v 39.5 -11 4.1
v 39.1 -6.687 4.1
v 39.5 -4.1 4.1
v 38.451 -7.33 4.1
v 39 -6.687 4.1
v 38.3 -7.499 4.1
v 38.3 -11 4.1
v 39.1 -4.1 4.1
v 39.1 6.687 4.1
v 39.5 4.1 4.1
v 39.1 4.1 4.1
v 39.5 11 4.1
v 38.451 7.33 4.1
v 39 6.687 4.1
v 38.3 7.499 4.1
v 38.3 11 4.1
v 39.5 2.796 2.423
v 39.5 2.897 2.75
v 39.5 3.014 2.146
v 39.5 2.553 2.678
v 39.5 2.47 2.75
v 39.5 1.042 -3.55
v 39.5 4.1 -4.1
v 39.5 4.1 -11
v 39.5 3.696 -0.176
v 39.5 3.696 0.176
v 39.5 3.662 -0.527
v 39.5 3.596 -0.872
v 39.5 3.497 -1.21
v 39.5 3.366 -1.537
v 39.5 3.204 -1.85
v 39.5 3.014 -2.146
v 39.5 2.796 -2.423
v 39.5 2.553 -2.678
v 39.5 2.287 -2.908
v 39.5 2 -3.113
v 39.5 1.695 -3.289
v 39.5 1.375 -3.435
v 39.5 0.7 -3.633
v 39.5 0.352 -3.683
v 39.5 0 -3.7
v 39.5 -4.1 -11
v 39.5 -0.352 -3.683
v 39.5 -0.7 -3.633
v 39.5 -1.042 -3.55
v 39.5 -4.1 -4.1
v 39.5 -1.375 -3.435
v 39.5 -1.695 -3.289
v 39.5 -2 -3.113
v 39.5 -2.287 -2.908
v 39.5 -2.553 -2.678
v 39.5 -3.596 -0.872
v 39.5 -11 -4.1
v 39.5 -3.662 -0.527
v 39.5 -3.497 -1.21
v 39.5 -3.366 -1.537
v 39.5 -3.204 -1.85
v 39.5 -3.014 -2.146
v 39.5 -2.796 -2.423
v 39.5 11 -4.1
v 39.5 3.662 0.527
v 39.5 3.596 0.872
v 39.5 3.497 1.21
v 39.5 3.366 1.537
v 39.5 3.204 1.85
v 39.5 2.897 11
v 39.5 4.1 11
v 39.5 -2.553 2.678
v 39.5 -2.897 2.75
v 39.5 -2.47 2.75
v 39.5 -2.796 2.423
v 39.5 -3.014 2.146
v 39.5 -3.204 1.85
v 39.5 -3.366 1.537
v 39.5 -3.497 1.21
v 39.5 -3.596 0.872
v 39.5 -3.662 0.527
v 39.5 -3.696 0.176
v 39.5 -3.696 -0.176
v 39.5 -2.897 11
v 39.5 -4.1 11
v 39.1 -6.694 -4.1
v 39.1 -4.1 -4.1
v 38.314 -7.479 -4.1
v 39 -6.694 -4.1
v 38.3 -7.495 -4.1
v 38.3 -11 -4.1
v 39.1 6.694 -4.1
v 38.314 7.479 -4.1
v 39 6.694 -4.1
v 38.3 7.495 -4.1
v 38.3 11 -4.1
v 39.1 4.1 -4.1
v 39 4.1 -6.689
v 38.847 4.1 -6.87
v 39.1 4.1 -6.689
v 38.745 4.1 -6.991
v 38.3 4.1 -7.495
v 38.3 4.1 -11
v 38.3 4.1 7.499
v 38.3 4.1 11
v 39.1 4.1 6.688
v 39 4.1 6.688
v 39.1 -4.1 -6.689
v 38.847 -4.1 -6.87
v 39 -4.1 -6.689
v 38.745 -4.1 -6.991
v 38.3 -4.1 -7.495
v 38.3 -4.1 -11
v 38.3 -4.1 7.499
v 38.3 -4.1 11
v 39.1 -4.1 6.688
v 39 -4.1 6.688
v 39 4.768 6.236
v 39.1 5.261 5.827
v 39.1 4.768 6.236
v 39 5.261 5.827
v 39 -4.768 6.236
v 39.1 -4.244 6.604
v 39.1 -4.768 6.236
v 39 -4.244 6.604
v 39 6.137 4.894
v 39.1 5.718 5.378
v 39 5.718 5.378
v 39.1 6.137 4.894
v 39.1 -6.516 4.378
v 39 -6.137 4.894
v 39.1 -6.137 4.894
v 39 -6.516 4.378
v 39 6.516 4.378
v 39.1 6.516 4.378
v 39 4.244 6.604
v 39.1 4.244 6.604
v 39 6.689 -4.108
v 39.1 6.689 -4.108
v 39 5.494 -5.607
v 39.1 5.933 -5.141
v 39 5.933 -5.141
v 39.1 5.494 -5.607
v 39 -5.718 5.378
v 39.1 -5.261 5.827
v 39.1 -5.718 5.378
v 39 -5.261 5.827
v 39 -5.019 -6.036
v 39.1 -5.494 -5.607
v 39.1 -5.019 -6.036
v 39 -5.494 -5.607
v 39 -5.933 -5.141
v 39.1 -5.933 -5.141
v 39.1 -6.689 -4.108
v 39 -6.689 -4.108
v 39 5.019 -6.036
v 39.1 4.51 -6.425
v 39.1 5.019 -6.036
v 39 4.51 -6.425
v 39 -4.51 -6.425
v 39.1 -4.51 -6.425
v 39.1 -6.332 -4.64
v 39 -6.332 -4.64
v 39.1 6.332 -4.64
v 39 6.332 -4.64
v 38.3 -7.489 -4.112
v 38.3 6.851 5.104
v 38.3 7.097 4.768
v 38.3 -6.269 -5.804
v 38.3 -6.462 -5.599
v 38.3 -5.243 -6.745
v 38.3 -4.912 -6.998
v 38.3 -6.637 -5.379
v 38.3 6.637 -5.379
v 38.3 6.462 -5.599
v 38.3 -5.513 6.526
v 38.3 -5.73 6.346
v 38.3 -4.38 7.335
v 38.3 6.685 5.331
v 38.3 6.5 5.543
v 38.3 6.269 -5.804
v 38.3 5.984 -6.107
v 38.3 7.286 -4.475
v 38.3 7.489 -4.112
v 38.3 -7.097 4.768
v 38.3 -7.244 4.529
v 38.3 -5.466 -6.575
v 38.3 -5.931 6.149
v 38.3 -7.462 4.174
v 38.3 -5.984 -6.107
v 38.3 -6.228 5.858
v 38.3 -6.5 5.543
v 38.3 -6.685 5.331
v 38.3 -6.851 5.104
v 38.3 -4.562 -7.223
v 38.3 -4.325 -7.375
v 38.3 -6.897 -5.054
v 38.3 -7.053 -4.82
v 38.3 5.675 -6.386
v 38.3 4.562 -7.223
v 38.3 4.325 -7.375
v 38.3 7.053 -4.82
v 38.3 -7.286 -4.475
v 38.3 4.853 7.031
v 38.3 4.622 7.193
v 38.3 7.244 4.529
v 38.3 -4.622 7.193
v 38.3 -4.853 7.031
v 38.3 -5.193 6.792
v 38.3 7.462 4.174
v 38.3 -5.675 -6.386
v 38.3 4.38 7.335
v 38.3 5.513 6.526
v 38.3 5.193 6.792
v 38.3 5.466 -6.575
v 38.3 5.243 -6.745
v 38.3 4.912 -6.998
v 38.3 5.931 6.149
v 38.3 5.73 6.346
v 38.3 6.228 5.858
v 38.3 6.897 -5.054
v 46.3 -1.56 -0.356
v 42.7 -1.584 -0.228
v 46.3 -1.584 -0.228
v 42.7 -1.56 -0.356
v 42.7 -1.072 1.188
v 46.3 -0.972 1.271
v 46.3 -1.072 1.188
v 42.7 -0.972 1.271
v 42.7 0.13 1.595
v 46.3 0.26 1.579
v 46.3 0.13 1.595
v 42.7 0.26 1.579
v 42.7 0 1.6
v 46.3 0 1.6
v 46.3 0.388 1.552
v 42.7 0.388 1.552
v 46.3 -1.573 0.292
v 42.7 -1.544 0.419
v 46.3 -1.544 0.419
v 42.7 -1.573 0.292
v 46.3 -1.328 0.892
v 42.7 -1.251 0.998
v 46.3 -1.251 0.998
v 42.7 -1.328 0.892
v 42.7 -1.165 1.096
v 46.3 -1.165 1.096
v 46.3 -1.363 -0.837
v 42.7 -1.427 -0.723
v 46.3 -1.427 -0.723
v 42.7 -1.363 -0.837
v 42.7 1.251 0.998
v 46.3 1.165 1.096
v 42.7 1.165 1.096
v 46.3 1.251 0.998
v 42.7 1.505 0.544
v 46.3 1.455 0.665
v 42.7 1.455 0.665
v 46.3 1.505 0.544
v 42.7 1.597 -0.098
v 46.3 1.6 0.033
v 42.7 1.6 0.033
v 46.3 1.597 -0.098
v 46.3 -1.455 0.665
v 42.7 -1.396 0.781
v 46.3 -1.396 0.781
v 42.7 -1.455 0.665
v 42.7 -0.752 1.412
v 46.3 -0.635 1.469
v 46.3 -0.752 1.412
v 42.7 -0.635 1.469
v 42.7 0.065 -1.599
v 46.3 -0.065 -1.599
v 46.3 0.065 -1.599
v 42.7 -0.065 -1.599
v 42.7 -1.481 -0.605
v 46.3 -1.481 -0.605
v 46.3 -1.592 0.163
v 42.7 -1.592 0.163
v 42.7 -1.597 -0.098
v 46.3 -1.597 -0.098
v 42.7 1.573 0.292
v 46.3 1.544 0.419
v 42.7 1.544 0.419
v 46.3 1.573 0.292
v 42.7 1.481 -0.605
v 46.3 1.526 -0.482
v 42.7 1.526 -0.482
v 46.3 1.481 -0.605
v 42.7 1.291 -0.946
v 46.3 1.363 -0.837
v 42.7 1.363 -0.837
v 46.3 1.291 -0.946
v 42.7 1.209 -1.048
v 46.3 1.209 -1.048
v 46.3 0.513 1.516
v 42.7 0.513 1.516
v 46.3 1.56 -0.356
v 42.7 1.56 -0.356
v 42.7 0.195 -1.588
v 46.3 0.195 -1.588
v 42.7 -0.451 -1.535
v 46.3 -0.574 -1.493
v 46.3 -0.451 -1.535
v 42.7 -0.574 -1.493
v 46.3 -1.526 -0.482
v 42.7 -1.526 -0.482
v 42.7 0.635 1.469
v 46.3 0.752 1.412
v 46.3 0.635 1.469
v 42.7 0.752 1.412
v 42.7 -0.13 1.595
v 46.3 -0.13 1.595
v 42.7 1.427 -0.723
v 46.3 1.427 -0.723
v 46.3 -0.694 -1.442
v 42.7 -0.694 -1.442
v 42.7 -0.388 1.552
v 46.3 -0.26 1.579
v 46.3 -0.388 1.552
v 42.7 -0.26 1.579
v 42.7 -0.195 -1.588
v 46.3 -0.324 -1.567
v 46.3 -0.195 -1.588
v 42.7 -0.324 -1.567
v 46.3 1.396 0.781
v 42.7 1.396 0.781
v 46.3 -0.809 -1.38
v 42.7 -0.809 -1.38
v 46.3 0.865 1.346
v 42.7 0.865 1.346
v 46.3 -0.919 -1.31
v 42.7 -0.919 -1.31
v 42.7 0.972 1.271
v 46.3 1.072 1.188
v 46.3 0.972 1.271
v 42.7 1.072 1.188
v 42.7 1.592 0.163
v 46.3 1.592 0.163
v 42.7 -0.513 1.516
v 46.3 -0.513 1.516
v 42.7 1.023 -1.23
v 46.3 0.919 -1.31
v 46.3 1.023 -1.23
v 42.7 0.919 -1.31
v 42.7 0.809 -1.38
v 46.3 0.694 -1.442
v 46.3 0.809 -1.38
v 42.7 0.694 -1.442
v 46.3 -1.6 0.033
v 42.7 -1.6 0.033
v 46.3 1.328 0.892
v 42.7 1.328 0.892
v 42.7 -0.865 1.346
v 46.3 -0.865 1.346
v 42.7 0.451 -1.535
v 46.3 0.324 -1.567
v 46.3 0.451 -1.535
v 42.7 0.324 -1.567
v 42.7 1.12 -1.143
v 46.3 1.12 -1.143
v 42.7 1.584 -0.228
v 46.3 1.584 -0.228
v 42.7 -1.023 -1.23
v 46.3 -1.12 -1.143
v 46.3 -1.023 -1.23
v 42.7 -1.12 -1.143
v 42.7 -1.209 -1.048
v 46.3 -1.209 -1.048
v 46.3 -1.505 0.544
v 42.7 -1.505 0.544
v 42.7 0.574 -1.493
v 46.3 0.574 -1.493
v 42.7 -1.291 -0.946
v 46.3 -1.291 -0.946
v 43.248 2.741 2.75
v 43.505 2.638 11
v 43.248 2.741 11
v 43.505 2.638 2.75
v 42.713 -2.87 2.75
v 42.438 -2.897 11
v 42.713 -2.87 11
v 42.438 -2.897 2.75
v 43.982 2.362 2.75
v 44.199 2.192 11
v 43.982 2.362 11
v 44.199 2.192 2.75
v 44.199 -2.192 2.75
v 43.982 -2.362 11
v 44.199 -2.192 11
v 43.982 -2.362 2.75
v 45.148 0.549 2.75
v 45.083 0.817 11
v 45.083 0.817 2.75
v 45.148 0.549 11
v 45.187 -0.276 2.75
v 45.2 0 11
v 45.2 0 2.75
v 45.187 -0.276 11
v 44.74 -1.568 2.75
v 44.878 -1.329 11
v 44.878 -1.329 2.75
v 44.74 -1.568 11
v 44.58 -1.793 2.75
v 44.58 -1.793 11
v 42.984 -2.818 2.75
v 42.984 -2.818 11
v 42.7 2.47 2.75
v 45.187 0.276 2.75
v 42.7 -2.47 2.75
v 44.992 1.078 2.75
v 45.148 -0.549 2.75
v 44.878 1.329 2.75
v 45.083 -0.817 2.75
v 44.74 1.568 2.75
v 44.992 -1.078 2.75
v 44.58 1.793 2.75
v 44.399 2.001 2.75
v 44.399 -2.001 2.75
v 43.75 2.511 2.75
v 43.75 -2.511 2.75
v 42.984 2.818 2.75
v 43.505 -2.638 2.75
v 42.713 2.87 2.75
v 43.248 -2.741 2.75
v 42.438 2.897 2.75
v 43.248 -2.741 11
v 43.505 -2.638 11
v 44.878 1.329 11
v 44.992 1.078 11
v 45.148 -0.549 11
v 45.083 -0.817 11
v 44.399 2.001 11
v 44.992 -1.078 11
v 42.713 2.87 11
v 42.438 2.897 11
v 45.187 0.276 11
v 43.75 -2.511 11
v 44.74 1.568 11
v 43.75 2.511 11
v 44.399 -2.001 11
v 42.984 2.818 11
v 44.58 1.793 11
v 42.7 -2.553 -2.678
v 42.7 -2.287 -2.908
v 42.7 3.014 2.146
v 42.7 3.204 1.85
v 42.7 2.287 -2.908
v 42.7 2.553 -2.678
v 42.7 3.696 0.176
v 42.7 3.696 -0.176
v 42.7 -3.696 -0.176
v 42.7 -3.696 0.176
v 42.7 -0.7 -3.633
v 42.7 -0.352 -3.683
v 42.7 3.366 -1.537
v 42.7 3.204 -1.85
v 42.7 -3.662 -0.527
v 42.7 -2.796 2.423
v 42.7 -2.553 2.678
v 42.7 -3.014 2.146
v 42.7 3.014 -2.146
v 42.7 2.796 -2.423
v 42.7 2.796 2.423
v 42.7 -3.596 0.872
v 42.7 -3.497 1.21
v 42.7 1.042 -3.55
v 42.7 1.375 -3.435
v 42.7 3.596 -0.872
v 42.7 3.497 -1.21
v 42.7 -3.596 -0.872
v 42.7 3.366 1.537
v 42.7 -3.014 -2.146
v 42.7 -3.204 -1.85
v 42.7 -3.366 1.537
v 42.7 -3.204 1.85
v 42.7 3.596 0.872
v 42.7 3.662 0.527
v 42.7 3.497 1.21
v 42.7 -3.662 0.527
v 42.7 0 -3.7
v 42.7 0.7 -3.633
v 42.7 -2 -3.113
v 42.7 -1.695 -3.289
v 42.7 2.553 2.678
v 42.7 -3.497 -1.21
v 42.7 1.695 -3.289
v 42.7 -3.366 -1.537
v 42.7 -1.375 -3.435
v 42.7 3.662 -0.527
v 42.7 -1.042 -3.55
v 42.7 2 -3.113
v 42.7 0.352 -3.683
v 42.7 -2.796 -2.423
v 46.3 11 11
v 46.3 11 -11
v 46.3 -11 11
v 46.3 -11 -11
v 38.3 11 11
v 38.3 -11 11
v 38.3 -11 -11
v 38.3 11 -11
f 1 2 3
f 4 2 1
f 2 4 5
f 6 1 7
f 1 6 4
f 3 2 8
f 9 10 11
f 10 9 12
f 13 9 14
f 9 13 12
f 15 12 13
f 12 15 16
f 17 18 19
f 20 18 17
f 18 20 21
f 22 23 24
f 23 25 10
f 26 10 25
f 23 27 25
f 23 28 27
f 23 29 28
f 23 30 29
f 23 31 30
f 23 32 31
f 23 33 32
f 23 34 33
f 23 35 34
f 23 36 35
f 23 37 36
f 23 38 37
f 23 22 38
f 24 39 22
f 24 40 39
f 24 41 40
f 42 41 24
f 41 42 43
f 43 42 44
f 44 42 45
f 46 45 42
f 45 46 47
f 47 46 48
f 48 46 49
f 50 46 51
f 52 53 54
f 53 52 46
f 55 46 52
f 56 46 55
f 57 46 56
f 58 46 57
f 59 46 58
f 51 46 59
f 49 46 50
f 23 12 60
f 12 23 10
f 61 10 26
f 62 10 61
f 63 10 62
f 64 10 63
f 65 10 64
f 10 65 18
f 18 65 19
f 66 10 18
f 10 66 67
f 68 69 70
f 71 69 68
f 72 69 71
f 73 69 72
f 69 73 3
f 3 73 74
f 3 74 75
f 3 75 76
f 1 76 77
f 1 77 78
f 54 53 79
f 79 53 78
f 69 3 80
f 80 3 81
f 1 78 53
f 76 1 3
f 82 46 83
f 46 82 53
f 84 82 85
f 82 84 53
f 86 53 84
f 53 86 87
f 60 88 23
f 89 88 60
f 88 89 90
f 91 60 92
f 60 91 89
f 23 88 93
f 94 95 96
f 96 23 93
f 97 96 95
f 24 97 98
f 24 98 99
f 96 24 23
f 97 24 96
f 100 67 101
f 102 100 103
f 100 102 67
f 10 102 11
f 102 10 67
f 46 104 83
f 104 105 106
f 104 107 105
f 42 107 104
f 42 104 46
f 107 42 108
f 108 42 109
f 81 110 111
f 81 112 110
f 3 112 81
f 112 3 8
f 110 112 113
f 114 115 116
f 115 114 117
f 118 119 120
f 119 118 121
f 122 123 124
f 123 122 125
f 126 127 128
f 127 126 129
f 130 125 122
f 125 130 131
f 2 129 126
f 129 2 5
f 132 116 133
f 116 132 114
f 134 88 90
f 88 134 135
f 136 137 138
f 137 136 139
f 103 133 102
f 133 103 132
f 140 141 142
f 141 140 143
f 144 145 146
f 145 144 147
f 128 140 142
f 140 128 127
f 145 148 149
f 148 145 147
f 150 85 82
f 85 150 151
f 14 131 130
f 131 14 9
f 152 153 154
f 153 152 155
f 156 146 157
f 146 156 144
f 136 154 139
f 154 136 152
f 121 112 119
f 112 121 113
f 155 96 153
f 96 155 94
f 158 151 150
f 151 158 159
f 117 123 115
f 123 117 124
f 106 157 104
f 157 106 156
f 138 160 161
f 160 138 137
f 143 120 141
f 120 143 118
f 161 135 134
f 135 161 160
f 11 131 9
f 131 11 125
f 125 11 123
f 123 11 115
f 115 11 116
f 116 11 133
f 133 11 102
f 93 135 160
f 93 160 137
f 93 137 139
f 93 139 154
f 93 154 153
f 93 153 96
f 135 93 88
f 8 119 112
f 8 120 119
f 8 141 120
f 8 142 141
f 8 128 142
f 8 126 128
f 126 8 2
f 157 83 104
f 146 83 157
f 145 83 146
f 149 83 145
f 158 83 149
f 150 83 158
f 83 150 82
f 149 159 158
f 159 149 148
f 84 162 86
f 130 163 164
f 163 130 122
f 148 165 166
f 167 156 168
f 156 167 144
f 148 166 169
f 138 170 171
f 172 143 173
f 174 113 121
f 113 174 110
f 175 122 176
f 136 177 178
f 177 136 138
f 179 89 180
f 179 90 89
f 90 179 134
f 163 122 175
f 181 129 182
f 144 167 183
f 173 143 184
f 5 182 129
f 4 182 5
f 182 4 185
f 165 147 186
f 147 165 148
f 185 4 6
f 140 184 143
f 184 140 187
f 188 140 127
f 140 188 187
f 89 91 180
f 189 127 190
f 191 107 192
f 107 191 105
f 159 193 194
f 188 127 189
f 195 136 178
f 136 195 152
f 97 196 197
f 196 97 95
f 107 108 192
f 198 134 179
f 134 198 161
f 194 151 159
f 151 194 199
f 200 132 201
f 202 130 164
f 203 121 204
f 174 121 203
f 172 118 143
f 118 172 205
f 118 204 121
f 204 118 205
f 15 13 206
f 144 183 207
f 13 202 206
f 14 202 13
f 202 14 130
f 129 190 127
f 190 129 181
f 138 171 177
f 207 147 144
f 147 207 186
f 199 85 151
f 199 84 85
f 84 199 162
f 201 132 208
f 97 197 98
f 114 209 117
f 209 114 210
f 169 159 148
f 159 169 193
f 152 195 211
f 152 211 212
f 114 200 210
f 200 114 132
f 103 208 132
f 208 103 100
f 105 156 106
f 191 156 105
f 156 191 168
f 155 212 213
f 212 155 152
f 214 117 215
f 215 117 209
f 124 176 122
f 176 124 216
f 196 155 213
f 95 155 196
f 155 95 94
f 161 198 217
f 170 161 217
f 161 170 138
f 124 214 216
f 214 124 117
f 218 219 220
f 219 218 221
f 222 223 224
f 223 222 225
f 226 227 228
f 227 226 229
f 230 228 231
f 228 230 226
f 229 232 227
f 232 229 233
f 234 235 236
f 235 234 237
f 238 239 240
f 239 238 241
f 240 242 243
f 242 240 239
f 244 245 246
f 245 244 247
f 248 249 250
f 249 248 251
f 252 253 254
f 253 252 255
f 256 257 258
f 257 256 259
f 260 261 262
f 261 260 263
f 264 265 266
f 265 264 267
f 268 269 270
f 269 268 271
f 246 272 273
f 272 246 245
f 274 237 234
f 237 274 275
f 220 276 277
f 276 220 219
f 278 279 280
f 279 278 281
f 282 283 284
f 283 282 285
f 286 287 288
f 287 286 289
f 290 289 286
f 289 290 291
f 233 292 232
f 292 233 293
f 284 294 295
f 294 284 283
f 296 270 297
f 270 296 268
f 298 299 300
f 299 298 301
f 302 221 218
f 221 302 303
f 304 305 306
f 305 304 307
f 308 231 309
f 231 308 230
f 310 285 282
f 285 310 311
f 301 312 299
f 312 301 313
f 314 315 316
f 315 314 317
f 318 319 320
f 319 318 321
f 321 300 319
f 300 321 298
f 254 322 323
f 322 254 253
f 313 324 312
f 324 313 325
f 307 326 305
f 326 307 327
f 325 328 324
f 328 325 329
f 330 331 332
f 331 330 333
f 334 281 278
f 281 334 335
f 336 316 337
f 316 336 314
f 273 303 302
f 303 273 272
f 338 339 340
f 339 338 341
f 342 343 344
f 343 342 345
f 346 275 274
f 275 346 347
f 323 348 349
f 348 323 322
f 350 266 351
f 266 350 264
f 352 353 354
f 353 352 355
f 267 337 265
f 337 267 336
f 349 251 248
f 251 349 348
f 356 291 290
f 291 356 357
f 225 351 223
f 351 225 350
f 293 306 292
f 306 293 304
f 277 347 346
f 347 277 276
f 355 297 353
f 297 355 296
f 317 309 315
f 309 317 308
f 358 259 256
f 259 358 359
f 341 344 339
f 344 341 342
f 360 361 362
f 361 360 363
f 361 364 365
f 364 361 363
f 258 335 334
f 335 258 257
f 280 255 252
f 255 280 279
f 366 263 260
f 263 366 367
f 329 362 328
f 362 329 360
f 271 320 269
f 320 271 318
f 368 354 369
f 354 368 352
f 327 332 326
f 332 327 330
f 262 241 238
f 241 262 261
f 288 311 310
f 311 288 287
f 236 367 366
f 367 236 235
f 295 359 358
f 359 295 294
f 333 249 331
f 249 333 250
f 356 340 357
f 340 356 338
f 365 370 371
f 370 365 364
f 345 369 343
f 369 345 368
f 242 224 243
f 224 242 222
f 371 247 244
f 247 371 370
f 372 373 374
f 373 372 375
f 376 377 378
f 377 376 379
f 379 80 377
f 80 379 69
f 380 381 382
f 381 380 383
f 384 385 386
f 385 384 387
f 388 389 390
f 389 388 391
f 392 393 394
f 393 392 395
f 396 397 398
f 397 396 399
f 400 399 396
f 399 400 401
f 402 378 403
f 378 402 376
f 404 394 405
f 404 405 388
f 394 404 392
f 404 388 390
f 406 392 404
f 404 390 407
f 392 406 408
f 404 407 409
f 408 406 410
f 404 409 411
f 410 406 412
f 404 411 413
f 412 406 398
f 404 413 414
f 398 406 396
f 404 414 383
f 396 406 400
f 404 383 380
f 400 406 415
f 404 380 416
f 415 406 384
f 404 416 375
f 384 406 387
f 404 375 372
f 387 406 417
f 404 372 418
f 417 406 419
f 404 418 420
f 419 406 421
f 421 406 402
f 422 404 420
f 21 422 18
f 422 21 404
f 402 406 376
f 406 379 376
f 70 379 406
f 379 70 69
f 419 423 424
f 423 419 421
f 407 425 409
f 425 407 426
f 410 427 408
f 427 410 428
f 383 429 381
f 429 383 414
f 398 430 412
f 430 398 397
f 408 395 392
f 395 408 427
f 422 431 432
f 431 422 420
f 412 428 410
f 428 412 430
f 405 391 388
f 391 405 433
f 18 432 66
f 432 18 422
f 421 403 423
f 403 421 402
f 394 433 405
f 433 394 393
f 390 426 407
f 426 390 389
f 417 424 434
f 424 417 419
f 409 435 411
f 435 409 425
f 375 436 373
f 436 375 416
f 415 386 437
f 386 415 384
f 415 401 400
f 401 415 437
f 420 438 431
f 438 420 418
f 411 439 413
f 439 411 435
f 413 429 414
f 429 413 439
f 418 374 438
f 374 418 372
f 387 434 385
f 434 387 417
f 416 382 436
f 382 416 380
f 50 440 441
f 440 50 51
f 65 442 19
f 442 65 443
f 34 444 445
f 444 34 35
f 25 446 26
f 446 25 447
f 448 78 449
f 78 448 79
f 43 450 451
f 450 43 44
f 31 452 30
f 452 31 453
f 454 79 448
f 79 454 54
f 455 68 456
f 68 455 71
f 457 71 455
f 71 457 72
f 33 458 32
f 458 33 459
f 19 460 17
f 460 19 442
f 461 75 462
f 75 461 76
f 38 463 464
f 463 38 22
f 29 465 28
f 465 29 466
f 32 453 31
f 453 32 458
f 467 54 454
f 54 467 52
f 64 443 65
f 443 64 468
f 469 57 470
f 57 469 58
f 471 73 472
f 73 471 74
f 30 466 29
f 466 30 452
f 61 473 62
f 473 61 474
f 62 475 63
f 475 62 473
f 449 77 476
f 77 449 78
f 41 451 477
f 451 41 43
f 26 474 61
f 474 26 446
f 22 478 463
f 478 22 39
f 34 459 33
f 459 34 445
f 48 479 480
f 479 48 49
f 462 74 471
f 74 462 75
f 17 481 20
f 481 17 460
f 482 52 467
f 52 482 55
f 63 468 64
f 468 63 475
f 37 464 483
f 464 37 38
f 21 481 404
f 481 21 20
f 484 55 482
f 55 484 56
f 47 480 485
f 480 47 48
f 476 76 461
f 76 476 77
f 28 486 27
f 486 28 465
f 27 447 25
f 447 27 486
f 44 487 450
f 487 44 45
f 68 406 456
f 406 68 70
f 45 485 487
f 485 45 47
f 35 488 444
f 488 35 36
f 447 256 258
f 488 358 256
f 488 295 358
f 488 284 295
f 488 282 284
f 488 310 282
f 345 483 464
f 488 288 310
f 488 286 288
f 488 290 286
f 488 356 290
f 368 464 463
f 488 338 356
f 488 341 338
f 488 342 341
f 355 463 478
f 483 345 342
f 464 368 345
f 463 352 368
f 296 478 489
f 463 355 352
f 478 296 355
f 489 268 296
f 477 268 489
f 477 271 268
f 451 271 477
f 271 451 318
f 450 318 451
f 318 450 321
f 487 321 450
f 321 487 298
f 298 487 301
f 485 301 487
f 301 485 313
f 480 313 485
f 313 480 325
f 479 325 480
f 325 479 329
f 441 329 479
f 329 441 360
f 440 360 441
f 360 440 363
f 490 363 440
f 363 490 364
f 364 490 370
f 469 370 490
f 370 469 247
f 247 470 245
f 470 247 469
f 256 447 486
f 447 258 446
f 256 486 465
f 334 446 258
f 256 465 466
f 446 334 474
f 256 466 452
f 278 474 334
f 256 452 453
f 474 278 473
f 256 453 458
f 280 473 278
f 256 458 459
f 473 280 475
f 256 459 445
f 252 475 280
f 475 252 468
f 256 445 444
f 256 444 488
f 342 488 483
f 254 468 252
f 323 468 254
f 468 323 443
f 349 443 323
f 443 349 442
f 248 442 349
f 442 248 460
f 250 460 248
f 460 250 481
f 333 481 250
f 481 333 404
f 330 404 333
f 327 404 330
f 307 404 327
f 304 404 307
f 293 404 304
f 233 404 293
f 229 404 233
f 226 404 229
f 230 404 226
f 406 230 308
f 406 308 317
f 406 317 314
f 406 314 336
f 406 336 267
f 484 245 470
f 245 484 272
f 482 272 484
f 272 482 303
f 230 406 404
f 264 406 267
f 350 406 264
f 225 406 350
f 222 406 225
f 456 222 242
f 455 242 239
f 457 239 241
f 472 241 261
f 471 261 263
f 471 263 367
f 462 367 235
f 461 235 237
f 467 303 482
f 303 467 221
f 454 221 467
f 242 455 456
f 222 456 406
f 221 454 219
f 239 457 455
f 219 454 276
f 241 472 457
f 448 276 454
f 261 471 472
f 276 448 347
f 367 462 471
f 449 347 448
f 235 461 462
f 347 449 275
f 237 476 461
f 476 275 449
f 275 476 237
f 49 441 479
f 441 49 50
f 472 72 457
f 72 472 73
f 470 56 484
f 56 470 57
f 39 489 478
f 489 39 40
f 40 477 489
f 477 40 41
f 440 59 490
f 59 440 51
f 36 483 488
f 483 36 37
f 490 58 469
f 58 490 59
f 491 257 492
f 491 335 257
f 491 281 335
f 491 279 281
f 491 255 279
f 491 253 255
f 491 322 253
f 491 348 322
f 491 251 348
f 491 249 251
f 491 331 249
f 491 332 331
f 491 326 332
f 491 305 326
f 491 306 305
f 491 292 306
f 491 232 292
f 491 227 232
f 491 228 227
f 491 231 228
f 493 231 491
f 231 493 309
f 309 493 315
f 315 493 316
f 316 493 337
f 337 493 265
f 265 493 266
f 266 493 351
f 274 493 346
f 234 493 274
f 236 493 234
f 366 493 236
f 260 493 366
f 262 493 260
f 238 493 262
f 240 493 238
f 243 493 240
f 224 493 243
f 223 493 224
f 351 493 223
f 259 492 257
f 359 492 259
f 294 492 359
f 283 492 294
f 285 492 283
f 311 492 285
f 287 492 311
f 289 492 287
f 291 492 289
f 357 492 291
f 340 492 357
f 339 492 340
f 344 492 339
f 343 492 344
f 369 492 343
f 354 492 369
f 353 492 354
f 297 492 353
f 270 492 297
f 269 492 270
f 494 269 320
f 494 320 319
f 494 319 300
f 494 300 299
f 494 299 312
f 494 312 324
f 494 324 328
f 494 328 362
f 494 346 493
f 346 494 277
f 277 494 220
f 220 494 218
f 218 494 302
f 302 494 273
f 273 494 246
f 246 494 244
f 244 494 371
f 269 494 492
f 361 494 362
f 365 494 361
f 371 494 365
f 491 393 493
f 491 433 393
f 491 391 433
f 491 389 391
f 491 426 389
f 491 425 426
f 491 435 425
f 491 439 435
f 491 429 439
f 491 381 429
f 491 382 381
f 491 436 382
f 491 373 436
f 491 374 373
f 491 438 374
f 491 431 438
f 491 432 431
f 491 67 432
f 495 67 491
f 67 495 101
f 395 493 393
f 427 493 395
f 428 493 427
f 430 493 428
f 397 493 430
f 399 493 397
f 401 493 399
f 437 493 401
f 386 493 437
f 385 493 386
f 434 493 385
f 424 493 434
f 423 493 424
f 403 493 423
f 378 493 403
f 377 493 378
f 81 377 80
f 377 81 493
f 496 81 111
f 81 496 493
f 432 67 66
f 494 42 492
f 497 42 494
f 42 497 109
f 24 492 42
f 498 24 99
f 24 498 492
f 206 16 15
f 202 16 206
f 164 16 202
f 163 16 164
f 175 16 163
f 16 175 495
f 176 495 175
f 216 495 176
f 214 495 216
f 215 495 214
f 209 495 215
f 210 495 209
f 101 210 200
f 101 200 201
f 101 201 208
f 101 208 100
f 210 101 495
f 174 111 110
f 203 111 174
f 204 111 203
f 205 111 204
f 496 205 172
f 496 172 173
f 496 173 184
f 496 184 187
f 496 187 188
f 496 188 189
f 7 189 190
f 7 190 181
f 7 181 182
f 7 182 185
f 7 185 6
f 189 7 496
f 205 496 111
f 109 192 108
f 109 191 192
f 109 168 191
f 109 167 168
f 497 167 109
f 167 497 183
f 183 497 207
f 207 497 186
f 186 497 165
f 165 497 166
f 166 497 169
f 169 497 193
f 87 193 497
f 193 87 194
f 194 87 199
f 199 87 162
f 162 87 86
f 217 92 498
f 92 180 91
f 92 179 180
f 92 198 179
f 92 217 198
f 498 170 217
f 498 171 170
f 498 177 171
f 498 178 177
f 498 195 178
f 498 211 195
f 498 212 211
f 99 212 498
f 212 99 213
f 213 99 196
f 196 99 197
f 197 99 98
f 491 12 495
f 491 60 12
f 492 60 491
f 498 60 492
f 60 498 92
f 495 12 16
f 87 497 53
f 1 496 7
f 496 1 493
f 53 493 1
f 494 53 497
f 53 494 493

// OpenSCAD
// file: ../Parts/rounder.scad
// rounder.scad
// cutting tool for rounding off corners with a cylinder

//---------------------
module rounder(
r=10,   // radius
h=10,   // height
f=22,    // $fn
extra=0.01  // extra size for the cube
){

difference(){
  translate([-extra,-extra,-extra])
  cube([r+extra,r+extra,h+2*extra]);
  translate([r,r,-1])
  cylinder(r=r,h=h+2,$fn=f);
}

}

//========================

rounder();

//========================
// file: ../Parts/tslot.scad
//=================================================================================
// tslot
// models for tslots used in PrusaDusa
// 
// Tom Flint, 2020
//=================================================================================
module tslot1(
tol = 0.0,
len = 60,
type = 1
){
    
// 30x30     
if(type==1){
    linear_extrude(height=len,convexity=10)
    difference(){
        offset(r=2.0+tol,$fn=20)
        square([26,26],center=true);
 
        translate([0,12,0])
        square([8.2-tol,8.2-tol],center=true);
        translate([0,-12,0])
        square([8.2-tol,8.2-tol],center=true);
        translate([12,0,0])
        square([8.2-tol,8.2-tol],center=true);
        translate([-12,0,0])
        square([8.2-tol,8.2-tol],center=true);
    }
}
    
// 30x60
if(type==2){
    linear_extrude(height=len,convexity=10)
    difference(){
        offset(r=2.0+tol,$fn=20)
        square([26,56],center=true);
 
        translate([0,27,0])
        square([8.2-tol,8.2-tol],center=true);
        translate([0,-27,0])
        square([8.2-tol,8.2-tol],center=true);
        
        translate([12,15,0])
        square([8.2-tol,8.2-tol],center=true);
        translate([-12,15,0])
        square([8.2-tol,8.2-tol],center=true);

        translate([12,-15,0])
        square([8.2-tol,8.2-tol],center=true);
        translate([-12,-15,0])
        square([8.2-tol,8.2-tol],center=true);
    }
}
    
// 36x60
if(type==3){
    linear_extrude(height=len,convexity=10)
    difference(){
        offset(r=2.0+tol,$fn=20)
        square([56,56],center=true);
 
        translate([15,27,0])
        square([8.2-tol,8.2-tol],center=true);
        translate([15,-27,0])
        square([8.2-tol,8.2-tol],center=true);
        
        translate([-15,27,0])
        square([8.2-tol,8.2-tol],center=true);
        translate([-15,-27,0])
        square([8.2-tol,8.2-tol],center=true);
        
        translate([27,15,0])
        square([8.2-tol,8.2-tol],center=true);
        translate([-27,15,0])
        square([8.2-tol,8.2-tol],center=true);

        translate([27,-15,0])
        square([8.2-tol,8.2-tol],center=true);
        translate([-27,-15,0])
        square([8.2-tol,8.2-tol],center=true);
    }
}
    
}

//--------------------------------------
module tbrace(
tol=0.0
){

F2=22;
 
translate([0,0,2-15])    
difference(){    
union(){
        cube([4.8,60,26]);
        cube([60,4.8,26]);
    
    hull(){
        translate([60-2.4,4.8,0])
        cylinder(r=2.4,h=26,$fn=F2);
        translate([4.8,60-2.4,0])
        cylinder(r=2.4,h=26,$fn=F2);
    }
}    

        translate([15,0,26/2])
        rotate([-90,0,0])
        cylinder(r1=3.5,r2=4.5,h=60,$fn=F2);
        translate([15+30,0,26/2])
        rotate([-90,0,0])
        cylinder(r1=3.5,r2=4.5,h=60,$fn=F2);

        translate([0,15,26/2])
        rotate([0,90,0])
        cylinder(r1=3.5,r2=4.5,h=60,$fn=F2);
        translate([0,15+30,26/2])
        rotate([0,90,0])
        cylinder(r1=3.5,r2=4.5,h=60,$fn=F2);

}
}

//----------------------------------------
module lbrace(
tol=0,
holes=0,
nuts=1
){

F2=22;
    
pts1=[ [5,0], [80,0], [85,5], [85,22], [80,28],
    [28,28], [28,80], [22,85], [5,85], [0,80], [0,5] ];
    
if(holes==1){
    difference(){
        linear_extrude(height=3.25+tol,convexity=10)
        offset(r=tol)
        polygon(points=pts1);
        
        translate([16+30,14,-1])
        cylinder(r=3.25,h=5,$fn=F2);
        translate([16+60,14,-1])
        cylinder(r=3.25,h=5,$fn=F2);

        translate([14,16+30,-1])
        cylinder(r=3.25,h=5,$fn=F2);
        translate([14,16+60,-1])
        cylinder(r=3.25,h=5,$fn=F2);
    }
}else{
        linear_extrude(height=3.25+tol,convexity=10)
        offset(r=tol)
        polygon(points=pts1);
}

if(nuts==1){
    
        translate([16+30,14,0])
        cylinder(r=5,h=6+3.25,$fn=F2);
        translate([16+60,14,0])
        cylinder(r=5,h=6+3.25,$fn=F2);

        translate([14,16+30,0])
        cylinder(r=5,h=6+3.25,$fn=F2);
        translate([14,16+60,0])
        cylinder(r=5,h=6+3.25,$fn=F2);
}

}


//=======================================

lbrace();

translate([50,50,0])
lbrace(tol=0.2);

//tbrace();

/*
color("cyan")
tslot1(len=70);

color("green")
translate([0,15,0])
tslot1(type=2);

color("red")
translate([15,15,0])
tslot1(type=3,len=50);

*/

//=======================================
// main file
//=================================================================================
// battery.scad
// rework of the VRUZEND battery end caps which all broke
// can still use the hardware contacts and jumpers
//
// Dr Tom Flint, 22 November 2021
//
//=================================================================================


use <../Parts/tslot.scad>
use <../Parts/rounder.scad>

//---------------------------------------------------------------------------------
module cell1(tol=0){
translate([0,0,-tol/2])
cylinder(r=18.40/2+tol/2,h=65.0+tol,$fn=123);

}

//---------------------------------------------------------------------------------
module end1(tol=0){

$fn=77;

  // main flat
  translate([0,0,-tol/2])
  cylinder(r=15.5/2+tol/2,h=0.75+tol);

  // make a cylindrical cut instead of 4 tabs
  translate([0,0,0])
  cylinder(r1=15.5/2+tol/2,r2=19.5/2+tol/2,h=2);

  // bolt
  translate([0,0,-7.5])
  cylinder(r=3/2+tol/2,h=7.5);
  cylinder(r=4.6/2+tol/2,h=5);
  
  // spring contact
  translate([0,0,6.2-tol/2])
  rotate([0,10,0])
  cylinder(r=12/2+tol/2,h=0.75+tol);
  translate([5-tol/2,-3+tol/2,-tol/2])
  cube([4+tol,6+tol,6+tol]);

}

//---------------------------------------------------------------------------------
module bar1(tol=0){

  difference(){
    translate([0,0,0.25+tol/2])
    cube([8+tol,33+tol,0.5+tol],center=true);

    translate([0,11,0])
    cylinder(r=2,h=3,center=true,$fn=33);

    translate([0,-11,0])
    cylinder(r=2,h=3,center=true,$fn=33);
  }

}

//---------------------------------------------------------------------------------
module bar1cut(tol=0){

    translate([0,-2,3+tol/2])
    cube([8+tol,33+tol+10,6+tol],center=true);

    translate([-8,11,3+tol/2])
    cube([8+tol,8+tol,6+tol],center=true);

    translate([0,-11,3+tol/2])
    cube([24+tol,8+tol,6+tol],center=true);

}

//---------------------------------------------------------------------------------
module wire1(tol=0){

  translate([0,0,-5.6/2])
  color("red"){
    // tab
    translate([0,0,-0.8+5.6/2-tol/2])
    cylinder(r=5.5/2+tol/2,h=0.80+tol,$fn=66);

    // tab to barrel
    translate([2,0,-0.4+5.6/2])
    cube([4+tol,3+tol,0.8+tol],center=true);

    // wire and insulator barrel
    translate([5.5/2,0,0])
    rotate([0,90,0]){
      cylinder(r=5.6/2+tol/2,h=13+tol,$fn=66);
      cylinder(r=1.6/2+tol/2,h=19+tol,$fn=66);
    }
  }
}
//---------------------------------------------------------------------------------
module wire1cut(tol=0){

  translate([0,0,-5.6/2])
  color("red"){
    // tab
    translate([0,0,-0.8+5.6/2-tol/2])
    cylinder(r=5.5/2+tol/2,h=0.80+tol,$fn=66);

    // tab to barrel
    translate([2,0,-0.4+5.6/2])
    cube([4+tol,3+tol,0.8+tol],center=true);

    // wire and insulator barrel
    translate([5.5/2,0,0])
    rotate([0,90,0]){
      hull(){
        cylinder(r=5.6/2+tol/2,h=13+tol,$fn=66);
        translate([-10,0,0])
        cylinder(r=5.6/2+tol/2,h=13+tol,$fn=66);
      }
      hull(){
        cylinder(r=1.6/2+tol/2,h=19+tol,$fn=66);
        translate([-10,0,0])
        cylinder(r=1.6/2+tol/2,h=19+tol,$fn=66);
      }
    }
  }
}

//---------------------------------------------------------------------------------
module two1(wire=3,tol=0.0){

  bar1(tol=tol);
  translate([0,11,0.5])
  end1(tol=tol);
  translate([0,-11,0.5])
  end1(tol=tol);

  // nuts
  if(wire==0){
    translate([0,11,-2.4])
    cylinder(r=6/2+tol,h=2.4+tol,$fn=6);
    translate([0,-11,-2.4])
    cylinder(r=6/2+tol,h=2.4+tol,$fn=6);
  }
  
  if(wire==1){
    translate([0,11,-2.4-0.8])
    cylinder(r=6/2+tol,h=2.4+tol,$fn=6);
    translate([0,11,0])
    wire1(tol=tol);
    
    translate([0,-11,-2.4])
    cylinder(r=6/2+tol,h=2.4+tol,$fn=6);
  }
  if(wire==2){
    translate([0,11,-2.4])
    cylinder(r=6/2+tol,h=2.4+tol,$fn=6);
    
    translate([0,-11,-2.4-0.8])
    cylinder(r=6/2+tol,h=2.4+tol,$fn=6);
    translate([0,-11,0])
    wire1(tol=tol);
  }
  if(wire==3){
    translate([0,11,-2.4-0.8])
    cylinder(r=6/2+tol,h=2.4+tol,$fn=6);
    translate([0,11,0])
    wire1(tol=tol);
    
    translate([0,-11,-2.4-0.8])
    cylinder(r=6/2+tol,h=2.4+tol,$fn=6);
    translate([0,-11,0])
    wire1(tol=tol);
  }
}

//---------------------------------------------------------------------------------
module two1cut(wire=3,tol=0.25){

  bar1cut(tol=tol);
  translate([0,11,0.5])
  end1(tol=tol);
  translate([0,-11,0.5])
  end1(tol=tol);

  // nut
  translate([0,11,-2.4-0.8])
  cylinder(r=7/2+tol,h=4+tol,$fn=66);
  // wire  
  translate([0,11,0])
  wire1cut(tol=tol);

  // nut
  translate([0,-11,-2.4-0.8])
  cylinder(r=7/2+tol,h=4+tol,$fn=66);
  // wire
  translate([0,-11,0])
  wire1cut(tol=tol);
}


//--------------------------------------------------------------------------------
module support1(both=0){

  difference(){
    color("cyan")
    union(){
      translate([25,0,0])
      cube([6,22,22],center=true);
      if(both==1){
        translate([-25,0,0])
        cube([6,22,22],center=true);
      }
    }

    hull(){
      translate([65/2,0,0])
      rotate([0,-90,0])
      color("green")
      cell1(tol=0.25);   

      translate([65/2,0,20])
      rotate([0,-90,0])
      color("green")
      cell1(tol=0.25);   
    }
    // material reduction
    translate([0,-11,-11])
    rotate([0,-90,0])
    color("blue")
    cylinder(r=3,h=200,center=true,$fn=67);
    translate([0,11,-11])
    rotate([0,-90,0])
    color("blue")
    cylinder(r=3,h=200,center=true,$fn=67);
  }

}


//--------------------------------------------------------------------------------
module endblock1(){

  translate([79/2,0,0])
  difference(){
    translate([2.8,0,0])
    cube([8,22,22],center=true);

    translate([0,11,0])
    rotate([0,-90,0])
    two1cut(wire=3,tol=0.2);
  }      

}

 //--------------------------------------------------------------------------------
module single(nuts=0,print=0){

  if(nuts==1){  
    translate([79/2,0,0])
    rotate([0,-90,0])
    color("silver")
    //two1(wire=1,tol=0);
    end1(tol=0);

    translate([-79/2,11,0])
    rotate([0,0,180])
    rotate([0,-90,0])
    color("silver")
    two1(wire=1,tol=0);
    //end1(tol=0);
    
    translate([65/2,0,0])
    rotate([0,-90,0])
    color("green")
    cell1(tol=0);   
  }

  if(print==0){
    // cell support
    support1(both=1);
    
    // end block
    endblock1();
    rotate([0,0,180])
    endblock1();
  }
  if(print==1){
    // cell support
    support1(both=0);
  }
  if(print==2){
    // end block
    endblock1();
  }
  

}

//--------------------------------------------------------------------------------
module multi(numY=4,bars=0,print=0){

depth=3;

  for(i=[0:numY-1]){
    difference(){
      union(){
        translate([0,22*i,0])
        single(print=print);

        translate([0,22*i,-22])
        rotate([180,0,0])
        single(print=print);
      }
      // cuts for tension bars
      translate([0,-11+22*i,-depth])
      tension(tol=0.2);
      translate([0,11+22*i,-depth])
      tension(tol=0.2);

      // cuts for tension bars
      translate([0,-11+22*i,-22+depth])
      rotate([180,0,0])
      tension(tol=0.2);
      translate([0,11+22*i,-22+depth])
      rotate([180,0,0])
      tension(tol=0.2);
    }
    if(bars==1){
      // tension bars
      translate([0,-11+22*i,-depth])
      tension(tol=0);
      translate([0,11+22*i,-depth])
      tension(tol=0);

      translate([0,-11+22*i,-22+depth])
      rotate([180,0,0])
      tension(tol=0);
      translate([0,11+22*i,-22+depth])
      rotate([180,0,0])
      tension(tol=0);
    }  
  }
}


//--------------------------------------------------------------------------------
module tension(tol=0){

  difference(){
    
    // beam
    translate([0,0,11])
    cube([104,3.5+tol,6+tol],center=true);

    // end block
    translate([79/2,0,0])
    translate([2.8,0,0])
    cube([8.3,22.3,22.3],center=true);

    // end block
    rotate([0,0,180])
    translate([79/2,0,0])
    translate([2.8,0,0])
    cube([8.3,22.3,22.3],center=true);
          
    translate([25,0,0])
    cube([6.3,22.3,22.3],center=true);
    translate([-25,0,0])
    cube([6.3,22.3,22.3],center=true);
  }

}

//=================================================================================


// disable cutaway views if printing or working single parts
if(0){
  
xcut=100;
ycut=100;
zcut=100;

cutcube = 200;

intersection(){
  translate([-cutcube+xcut,-cutcube+ycut,-cutcube+zcut])
  cube([cutcube,cutcube,cutcube]);
  
  union(){


  //single();
  multi(numY=2);

  //tension();

  if(0){
    translate([100,0,0])
    end1();

    translate([50,0,0])
    bar1();

    translate([150,0,0])
    cell1();

    two1();

    translate([-50,0,0])
    wire1();
  }


  //two1cut(wire=3,tol=0.25);

  if(0){
    difference(){
      translate([2.8,0,0])
      cube([8,42,18],center=true);

      translate([0,0,0])
      rotate([0,-90,0])
      two1cut(wire=3,tol=0.2);
    }
  }

  }
}
}


// for printing
//multi(numY=2,print=2);
//tension();
endblock1();


//=================================================================================
